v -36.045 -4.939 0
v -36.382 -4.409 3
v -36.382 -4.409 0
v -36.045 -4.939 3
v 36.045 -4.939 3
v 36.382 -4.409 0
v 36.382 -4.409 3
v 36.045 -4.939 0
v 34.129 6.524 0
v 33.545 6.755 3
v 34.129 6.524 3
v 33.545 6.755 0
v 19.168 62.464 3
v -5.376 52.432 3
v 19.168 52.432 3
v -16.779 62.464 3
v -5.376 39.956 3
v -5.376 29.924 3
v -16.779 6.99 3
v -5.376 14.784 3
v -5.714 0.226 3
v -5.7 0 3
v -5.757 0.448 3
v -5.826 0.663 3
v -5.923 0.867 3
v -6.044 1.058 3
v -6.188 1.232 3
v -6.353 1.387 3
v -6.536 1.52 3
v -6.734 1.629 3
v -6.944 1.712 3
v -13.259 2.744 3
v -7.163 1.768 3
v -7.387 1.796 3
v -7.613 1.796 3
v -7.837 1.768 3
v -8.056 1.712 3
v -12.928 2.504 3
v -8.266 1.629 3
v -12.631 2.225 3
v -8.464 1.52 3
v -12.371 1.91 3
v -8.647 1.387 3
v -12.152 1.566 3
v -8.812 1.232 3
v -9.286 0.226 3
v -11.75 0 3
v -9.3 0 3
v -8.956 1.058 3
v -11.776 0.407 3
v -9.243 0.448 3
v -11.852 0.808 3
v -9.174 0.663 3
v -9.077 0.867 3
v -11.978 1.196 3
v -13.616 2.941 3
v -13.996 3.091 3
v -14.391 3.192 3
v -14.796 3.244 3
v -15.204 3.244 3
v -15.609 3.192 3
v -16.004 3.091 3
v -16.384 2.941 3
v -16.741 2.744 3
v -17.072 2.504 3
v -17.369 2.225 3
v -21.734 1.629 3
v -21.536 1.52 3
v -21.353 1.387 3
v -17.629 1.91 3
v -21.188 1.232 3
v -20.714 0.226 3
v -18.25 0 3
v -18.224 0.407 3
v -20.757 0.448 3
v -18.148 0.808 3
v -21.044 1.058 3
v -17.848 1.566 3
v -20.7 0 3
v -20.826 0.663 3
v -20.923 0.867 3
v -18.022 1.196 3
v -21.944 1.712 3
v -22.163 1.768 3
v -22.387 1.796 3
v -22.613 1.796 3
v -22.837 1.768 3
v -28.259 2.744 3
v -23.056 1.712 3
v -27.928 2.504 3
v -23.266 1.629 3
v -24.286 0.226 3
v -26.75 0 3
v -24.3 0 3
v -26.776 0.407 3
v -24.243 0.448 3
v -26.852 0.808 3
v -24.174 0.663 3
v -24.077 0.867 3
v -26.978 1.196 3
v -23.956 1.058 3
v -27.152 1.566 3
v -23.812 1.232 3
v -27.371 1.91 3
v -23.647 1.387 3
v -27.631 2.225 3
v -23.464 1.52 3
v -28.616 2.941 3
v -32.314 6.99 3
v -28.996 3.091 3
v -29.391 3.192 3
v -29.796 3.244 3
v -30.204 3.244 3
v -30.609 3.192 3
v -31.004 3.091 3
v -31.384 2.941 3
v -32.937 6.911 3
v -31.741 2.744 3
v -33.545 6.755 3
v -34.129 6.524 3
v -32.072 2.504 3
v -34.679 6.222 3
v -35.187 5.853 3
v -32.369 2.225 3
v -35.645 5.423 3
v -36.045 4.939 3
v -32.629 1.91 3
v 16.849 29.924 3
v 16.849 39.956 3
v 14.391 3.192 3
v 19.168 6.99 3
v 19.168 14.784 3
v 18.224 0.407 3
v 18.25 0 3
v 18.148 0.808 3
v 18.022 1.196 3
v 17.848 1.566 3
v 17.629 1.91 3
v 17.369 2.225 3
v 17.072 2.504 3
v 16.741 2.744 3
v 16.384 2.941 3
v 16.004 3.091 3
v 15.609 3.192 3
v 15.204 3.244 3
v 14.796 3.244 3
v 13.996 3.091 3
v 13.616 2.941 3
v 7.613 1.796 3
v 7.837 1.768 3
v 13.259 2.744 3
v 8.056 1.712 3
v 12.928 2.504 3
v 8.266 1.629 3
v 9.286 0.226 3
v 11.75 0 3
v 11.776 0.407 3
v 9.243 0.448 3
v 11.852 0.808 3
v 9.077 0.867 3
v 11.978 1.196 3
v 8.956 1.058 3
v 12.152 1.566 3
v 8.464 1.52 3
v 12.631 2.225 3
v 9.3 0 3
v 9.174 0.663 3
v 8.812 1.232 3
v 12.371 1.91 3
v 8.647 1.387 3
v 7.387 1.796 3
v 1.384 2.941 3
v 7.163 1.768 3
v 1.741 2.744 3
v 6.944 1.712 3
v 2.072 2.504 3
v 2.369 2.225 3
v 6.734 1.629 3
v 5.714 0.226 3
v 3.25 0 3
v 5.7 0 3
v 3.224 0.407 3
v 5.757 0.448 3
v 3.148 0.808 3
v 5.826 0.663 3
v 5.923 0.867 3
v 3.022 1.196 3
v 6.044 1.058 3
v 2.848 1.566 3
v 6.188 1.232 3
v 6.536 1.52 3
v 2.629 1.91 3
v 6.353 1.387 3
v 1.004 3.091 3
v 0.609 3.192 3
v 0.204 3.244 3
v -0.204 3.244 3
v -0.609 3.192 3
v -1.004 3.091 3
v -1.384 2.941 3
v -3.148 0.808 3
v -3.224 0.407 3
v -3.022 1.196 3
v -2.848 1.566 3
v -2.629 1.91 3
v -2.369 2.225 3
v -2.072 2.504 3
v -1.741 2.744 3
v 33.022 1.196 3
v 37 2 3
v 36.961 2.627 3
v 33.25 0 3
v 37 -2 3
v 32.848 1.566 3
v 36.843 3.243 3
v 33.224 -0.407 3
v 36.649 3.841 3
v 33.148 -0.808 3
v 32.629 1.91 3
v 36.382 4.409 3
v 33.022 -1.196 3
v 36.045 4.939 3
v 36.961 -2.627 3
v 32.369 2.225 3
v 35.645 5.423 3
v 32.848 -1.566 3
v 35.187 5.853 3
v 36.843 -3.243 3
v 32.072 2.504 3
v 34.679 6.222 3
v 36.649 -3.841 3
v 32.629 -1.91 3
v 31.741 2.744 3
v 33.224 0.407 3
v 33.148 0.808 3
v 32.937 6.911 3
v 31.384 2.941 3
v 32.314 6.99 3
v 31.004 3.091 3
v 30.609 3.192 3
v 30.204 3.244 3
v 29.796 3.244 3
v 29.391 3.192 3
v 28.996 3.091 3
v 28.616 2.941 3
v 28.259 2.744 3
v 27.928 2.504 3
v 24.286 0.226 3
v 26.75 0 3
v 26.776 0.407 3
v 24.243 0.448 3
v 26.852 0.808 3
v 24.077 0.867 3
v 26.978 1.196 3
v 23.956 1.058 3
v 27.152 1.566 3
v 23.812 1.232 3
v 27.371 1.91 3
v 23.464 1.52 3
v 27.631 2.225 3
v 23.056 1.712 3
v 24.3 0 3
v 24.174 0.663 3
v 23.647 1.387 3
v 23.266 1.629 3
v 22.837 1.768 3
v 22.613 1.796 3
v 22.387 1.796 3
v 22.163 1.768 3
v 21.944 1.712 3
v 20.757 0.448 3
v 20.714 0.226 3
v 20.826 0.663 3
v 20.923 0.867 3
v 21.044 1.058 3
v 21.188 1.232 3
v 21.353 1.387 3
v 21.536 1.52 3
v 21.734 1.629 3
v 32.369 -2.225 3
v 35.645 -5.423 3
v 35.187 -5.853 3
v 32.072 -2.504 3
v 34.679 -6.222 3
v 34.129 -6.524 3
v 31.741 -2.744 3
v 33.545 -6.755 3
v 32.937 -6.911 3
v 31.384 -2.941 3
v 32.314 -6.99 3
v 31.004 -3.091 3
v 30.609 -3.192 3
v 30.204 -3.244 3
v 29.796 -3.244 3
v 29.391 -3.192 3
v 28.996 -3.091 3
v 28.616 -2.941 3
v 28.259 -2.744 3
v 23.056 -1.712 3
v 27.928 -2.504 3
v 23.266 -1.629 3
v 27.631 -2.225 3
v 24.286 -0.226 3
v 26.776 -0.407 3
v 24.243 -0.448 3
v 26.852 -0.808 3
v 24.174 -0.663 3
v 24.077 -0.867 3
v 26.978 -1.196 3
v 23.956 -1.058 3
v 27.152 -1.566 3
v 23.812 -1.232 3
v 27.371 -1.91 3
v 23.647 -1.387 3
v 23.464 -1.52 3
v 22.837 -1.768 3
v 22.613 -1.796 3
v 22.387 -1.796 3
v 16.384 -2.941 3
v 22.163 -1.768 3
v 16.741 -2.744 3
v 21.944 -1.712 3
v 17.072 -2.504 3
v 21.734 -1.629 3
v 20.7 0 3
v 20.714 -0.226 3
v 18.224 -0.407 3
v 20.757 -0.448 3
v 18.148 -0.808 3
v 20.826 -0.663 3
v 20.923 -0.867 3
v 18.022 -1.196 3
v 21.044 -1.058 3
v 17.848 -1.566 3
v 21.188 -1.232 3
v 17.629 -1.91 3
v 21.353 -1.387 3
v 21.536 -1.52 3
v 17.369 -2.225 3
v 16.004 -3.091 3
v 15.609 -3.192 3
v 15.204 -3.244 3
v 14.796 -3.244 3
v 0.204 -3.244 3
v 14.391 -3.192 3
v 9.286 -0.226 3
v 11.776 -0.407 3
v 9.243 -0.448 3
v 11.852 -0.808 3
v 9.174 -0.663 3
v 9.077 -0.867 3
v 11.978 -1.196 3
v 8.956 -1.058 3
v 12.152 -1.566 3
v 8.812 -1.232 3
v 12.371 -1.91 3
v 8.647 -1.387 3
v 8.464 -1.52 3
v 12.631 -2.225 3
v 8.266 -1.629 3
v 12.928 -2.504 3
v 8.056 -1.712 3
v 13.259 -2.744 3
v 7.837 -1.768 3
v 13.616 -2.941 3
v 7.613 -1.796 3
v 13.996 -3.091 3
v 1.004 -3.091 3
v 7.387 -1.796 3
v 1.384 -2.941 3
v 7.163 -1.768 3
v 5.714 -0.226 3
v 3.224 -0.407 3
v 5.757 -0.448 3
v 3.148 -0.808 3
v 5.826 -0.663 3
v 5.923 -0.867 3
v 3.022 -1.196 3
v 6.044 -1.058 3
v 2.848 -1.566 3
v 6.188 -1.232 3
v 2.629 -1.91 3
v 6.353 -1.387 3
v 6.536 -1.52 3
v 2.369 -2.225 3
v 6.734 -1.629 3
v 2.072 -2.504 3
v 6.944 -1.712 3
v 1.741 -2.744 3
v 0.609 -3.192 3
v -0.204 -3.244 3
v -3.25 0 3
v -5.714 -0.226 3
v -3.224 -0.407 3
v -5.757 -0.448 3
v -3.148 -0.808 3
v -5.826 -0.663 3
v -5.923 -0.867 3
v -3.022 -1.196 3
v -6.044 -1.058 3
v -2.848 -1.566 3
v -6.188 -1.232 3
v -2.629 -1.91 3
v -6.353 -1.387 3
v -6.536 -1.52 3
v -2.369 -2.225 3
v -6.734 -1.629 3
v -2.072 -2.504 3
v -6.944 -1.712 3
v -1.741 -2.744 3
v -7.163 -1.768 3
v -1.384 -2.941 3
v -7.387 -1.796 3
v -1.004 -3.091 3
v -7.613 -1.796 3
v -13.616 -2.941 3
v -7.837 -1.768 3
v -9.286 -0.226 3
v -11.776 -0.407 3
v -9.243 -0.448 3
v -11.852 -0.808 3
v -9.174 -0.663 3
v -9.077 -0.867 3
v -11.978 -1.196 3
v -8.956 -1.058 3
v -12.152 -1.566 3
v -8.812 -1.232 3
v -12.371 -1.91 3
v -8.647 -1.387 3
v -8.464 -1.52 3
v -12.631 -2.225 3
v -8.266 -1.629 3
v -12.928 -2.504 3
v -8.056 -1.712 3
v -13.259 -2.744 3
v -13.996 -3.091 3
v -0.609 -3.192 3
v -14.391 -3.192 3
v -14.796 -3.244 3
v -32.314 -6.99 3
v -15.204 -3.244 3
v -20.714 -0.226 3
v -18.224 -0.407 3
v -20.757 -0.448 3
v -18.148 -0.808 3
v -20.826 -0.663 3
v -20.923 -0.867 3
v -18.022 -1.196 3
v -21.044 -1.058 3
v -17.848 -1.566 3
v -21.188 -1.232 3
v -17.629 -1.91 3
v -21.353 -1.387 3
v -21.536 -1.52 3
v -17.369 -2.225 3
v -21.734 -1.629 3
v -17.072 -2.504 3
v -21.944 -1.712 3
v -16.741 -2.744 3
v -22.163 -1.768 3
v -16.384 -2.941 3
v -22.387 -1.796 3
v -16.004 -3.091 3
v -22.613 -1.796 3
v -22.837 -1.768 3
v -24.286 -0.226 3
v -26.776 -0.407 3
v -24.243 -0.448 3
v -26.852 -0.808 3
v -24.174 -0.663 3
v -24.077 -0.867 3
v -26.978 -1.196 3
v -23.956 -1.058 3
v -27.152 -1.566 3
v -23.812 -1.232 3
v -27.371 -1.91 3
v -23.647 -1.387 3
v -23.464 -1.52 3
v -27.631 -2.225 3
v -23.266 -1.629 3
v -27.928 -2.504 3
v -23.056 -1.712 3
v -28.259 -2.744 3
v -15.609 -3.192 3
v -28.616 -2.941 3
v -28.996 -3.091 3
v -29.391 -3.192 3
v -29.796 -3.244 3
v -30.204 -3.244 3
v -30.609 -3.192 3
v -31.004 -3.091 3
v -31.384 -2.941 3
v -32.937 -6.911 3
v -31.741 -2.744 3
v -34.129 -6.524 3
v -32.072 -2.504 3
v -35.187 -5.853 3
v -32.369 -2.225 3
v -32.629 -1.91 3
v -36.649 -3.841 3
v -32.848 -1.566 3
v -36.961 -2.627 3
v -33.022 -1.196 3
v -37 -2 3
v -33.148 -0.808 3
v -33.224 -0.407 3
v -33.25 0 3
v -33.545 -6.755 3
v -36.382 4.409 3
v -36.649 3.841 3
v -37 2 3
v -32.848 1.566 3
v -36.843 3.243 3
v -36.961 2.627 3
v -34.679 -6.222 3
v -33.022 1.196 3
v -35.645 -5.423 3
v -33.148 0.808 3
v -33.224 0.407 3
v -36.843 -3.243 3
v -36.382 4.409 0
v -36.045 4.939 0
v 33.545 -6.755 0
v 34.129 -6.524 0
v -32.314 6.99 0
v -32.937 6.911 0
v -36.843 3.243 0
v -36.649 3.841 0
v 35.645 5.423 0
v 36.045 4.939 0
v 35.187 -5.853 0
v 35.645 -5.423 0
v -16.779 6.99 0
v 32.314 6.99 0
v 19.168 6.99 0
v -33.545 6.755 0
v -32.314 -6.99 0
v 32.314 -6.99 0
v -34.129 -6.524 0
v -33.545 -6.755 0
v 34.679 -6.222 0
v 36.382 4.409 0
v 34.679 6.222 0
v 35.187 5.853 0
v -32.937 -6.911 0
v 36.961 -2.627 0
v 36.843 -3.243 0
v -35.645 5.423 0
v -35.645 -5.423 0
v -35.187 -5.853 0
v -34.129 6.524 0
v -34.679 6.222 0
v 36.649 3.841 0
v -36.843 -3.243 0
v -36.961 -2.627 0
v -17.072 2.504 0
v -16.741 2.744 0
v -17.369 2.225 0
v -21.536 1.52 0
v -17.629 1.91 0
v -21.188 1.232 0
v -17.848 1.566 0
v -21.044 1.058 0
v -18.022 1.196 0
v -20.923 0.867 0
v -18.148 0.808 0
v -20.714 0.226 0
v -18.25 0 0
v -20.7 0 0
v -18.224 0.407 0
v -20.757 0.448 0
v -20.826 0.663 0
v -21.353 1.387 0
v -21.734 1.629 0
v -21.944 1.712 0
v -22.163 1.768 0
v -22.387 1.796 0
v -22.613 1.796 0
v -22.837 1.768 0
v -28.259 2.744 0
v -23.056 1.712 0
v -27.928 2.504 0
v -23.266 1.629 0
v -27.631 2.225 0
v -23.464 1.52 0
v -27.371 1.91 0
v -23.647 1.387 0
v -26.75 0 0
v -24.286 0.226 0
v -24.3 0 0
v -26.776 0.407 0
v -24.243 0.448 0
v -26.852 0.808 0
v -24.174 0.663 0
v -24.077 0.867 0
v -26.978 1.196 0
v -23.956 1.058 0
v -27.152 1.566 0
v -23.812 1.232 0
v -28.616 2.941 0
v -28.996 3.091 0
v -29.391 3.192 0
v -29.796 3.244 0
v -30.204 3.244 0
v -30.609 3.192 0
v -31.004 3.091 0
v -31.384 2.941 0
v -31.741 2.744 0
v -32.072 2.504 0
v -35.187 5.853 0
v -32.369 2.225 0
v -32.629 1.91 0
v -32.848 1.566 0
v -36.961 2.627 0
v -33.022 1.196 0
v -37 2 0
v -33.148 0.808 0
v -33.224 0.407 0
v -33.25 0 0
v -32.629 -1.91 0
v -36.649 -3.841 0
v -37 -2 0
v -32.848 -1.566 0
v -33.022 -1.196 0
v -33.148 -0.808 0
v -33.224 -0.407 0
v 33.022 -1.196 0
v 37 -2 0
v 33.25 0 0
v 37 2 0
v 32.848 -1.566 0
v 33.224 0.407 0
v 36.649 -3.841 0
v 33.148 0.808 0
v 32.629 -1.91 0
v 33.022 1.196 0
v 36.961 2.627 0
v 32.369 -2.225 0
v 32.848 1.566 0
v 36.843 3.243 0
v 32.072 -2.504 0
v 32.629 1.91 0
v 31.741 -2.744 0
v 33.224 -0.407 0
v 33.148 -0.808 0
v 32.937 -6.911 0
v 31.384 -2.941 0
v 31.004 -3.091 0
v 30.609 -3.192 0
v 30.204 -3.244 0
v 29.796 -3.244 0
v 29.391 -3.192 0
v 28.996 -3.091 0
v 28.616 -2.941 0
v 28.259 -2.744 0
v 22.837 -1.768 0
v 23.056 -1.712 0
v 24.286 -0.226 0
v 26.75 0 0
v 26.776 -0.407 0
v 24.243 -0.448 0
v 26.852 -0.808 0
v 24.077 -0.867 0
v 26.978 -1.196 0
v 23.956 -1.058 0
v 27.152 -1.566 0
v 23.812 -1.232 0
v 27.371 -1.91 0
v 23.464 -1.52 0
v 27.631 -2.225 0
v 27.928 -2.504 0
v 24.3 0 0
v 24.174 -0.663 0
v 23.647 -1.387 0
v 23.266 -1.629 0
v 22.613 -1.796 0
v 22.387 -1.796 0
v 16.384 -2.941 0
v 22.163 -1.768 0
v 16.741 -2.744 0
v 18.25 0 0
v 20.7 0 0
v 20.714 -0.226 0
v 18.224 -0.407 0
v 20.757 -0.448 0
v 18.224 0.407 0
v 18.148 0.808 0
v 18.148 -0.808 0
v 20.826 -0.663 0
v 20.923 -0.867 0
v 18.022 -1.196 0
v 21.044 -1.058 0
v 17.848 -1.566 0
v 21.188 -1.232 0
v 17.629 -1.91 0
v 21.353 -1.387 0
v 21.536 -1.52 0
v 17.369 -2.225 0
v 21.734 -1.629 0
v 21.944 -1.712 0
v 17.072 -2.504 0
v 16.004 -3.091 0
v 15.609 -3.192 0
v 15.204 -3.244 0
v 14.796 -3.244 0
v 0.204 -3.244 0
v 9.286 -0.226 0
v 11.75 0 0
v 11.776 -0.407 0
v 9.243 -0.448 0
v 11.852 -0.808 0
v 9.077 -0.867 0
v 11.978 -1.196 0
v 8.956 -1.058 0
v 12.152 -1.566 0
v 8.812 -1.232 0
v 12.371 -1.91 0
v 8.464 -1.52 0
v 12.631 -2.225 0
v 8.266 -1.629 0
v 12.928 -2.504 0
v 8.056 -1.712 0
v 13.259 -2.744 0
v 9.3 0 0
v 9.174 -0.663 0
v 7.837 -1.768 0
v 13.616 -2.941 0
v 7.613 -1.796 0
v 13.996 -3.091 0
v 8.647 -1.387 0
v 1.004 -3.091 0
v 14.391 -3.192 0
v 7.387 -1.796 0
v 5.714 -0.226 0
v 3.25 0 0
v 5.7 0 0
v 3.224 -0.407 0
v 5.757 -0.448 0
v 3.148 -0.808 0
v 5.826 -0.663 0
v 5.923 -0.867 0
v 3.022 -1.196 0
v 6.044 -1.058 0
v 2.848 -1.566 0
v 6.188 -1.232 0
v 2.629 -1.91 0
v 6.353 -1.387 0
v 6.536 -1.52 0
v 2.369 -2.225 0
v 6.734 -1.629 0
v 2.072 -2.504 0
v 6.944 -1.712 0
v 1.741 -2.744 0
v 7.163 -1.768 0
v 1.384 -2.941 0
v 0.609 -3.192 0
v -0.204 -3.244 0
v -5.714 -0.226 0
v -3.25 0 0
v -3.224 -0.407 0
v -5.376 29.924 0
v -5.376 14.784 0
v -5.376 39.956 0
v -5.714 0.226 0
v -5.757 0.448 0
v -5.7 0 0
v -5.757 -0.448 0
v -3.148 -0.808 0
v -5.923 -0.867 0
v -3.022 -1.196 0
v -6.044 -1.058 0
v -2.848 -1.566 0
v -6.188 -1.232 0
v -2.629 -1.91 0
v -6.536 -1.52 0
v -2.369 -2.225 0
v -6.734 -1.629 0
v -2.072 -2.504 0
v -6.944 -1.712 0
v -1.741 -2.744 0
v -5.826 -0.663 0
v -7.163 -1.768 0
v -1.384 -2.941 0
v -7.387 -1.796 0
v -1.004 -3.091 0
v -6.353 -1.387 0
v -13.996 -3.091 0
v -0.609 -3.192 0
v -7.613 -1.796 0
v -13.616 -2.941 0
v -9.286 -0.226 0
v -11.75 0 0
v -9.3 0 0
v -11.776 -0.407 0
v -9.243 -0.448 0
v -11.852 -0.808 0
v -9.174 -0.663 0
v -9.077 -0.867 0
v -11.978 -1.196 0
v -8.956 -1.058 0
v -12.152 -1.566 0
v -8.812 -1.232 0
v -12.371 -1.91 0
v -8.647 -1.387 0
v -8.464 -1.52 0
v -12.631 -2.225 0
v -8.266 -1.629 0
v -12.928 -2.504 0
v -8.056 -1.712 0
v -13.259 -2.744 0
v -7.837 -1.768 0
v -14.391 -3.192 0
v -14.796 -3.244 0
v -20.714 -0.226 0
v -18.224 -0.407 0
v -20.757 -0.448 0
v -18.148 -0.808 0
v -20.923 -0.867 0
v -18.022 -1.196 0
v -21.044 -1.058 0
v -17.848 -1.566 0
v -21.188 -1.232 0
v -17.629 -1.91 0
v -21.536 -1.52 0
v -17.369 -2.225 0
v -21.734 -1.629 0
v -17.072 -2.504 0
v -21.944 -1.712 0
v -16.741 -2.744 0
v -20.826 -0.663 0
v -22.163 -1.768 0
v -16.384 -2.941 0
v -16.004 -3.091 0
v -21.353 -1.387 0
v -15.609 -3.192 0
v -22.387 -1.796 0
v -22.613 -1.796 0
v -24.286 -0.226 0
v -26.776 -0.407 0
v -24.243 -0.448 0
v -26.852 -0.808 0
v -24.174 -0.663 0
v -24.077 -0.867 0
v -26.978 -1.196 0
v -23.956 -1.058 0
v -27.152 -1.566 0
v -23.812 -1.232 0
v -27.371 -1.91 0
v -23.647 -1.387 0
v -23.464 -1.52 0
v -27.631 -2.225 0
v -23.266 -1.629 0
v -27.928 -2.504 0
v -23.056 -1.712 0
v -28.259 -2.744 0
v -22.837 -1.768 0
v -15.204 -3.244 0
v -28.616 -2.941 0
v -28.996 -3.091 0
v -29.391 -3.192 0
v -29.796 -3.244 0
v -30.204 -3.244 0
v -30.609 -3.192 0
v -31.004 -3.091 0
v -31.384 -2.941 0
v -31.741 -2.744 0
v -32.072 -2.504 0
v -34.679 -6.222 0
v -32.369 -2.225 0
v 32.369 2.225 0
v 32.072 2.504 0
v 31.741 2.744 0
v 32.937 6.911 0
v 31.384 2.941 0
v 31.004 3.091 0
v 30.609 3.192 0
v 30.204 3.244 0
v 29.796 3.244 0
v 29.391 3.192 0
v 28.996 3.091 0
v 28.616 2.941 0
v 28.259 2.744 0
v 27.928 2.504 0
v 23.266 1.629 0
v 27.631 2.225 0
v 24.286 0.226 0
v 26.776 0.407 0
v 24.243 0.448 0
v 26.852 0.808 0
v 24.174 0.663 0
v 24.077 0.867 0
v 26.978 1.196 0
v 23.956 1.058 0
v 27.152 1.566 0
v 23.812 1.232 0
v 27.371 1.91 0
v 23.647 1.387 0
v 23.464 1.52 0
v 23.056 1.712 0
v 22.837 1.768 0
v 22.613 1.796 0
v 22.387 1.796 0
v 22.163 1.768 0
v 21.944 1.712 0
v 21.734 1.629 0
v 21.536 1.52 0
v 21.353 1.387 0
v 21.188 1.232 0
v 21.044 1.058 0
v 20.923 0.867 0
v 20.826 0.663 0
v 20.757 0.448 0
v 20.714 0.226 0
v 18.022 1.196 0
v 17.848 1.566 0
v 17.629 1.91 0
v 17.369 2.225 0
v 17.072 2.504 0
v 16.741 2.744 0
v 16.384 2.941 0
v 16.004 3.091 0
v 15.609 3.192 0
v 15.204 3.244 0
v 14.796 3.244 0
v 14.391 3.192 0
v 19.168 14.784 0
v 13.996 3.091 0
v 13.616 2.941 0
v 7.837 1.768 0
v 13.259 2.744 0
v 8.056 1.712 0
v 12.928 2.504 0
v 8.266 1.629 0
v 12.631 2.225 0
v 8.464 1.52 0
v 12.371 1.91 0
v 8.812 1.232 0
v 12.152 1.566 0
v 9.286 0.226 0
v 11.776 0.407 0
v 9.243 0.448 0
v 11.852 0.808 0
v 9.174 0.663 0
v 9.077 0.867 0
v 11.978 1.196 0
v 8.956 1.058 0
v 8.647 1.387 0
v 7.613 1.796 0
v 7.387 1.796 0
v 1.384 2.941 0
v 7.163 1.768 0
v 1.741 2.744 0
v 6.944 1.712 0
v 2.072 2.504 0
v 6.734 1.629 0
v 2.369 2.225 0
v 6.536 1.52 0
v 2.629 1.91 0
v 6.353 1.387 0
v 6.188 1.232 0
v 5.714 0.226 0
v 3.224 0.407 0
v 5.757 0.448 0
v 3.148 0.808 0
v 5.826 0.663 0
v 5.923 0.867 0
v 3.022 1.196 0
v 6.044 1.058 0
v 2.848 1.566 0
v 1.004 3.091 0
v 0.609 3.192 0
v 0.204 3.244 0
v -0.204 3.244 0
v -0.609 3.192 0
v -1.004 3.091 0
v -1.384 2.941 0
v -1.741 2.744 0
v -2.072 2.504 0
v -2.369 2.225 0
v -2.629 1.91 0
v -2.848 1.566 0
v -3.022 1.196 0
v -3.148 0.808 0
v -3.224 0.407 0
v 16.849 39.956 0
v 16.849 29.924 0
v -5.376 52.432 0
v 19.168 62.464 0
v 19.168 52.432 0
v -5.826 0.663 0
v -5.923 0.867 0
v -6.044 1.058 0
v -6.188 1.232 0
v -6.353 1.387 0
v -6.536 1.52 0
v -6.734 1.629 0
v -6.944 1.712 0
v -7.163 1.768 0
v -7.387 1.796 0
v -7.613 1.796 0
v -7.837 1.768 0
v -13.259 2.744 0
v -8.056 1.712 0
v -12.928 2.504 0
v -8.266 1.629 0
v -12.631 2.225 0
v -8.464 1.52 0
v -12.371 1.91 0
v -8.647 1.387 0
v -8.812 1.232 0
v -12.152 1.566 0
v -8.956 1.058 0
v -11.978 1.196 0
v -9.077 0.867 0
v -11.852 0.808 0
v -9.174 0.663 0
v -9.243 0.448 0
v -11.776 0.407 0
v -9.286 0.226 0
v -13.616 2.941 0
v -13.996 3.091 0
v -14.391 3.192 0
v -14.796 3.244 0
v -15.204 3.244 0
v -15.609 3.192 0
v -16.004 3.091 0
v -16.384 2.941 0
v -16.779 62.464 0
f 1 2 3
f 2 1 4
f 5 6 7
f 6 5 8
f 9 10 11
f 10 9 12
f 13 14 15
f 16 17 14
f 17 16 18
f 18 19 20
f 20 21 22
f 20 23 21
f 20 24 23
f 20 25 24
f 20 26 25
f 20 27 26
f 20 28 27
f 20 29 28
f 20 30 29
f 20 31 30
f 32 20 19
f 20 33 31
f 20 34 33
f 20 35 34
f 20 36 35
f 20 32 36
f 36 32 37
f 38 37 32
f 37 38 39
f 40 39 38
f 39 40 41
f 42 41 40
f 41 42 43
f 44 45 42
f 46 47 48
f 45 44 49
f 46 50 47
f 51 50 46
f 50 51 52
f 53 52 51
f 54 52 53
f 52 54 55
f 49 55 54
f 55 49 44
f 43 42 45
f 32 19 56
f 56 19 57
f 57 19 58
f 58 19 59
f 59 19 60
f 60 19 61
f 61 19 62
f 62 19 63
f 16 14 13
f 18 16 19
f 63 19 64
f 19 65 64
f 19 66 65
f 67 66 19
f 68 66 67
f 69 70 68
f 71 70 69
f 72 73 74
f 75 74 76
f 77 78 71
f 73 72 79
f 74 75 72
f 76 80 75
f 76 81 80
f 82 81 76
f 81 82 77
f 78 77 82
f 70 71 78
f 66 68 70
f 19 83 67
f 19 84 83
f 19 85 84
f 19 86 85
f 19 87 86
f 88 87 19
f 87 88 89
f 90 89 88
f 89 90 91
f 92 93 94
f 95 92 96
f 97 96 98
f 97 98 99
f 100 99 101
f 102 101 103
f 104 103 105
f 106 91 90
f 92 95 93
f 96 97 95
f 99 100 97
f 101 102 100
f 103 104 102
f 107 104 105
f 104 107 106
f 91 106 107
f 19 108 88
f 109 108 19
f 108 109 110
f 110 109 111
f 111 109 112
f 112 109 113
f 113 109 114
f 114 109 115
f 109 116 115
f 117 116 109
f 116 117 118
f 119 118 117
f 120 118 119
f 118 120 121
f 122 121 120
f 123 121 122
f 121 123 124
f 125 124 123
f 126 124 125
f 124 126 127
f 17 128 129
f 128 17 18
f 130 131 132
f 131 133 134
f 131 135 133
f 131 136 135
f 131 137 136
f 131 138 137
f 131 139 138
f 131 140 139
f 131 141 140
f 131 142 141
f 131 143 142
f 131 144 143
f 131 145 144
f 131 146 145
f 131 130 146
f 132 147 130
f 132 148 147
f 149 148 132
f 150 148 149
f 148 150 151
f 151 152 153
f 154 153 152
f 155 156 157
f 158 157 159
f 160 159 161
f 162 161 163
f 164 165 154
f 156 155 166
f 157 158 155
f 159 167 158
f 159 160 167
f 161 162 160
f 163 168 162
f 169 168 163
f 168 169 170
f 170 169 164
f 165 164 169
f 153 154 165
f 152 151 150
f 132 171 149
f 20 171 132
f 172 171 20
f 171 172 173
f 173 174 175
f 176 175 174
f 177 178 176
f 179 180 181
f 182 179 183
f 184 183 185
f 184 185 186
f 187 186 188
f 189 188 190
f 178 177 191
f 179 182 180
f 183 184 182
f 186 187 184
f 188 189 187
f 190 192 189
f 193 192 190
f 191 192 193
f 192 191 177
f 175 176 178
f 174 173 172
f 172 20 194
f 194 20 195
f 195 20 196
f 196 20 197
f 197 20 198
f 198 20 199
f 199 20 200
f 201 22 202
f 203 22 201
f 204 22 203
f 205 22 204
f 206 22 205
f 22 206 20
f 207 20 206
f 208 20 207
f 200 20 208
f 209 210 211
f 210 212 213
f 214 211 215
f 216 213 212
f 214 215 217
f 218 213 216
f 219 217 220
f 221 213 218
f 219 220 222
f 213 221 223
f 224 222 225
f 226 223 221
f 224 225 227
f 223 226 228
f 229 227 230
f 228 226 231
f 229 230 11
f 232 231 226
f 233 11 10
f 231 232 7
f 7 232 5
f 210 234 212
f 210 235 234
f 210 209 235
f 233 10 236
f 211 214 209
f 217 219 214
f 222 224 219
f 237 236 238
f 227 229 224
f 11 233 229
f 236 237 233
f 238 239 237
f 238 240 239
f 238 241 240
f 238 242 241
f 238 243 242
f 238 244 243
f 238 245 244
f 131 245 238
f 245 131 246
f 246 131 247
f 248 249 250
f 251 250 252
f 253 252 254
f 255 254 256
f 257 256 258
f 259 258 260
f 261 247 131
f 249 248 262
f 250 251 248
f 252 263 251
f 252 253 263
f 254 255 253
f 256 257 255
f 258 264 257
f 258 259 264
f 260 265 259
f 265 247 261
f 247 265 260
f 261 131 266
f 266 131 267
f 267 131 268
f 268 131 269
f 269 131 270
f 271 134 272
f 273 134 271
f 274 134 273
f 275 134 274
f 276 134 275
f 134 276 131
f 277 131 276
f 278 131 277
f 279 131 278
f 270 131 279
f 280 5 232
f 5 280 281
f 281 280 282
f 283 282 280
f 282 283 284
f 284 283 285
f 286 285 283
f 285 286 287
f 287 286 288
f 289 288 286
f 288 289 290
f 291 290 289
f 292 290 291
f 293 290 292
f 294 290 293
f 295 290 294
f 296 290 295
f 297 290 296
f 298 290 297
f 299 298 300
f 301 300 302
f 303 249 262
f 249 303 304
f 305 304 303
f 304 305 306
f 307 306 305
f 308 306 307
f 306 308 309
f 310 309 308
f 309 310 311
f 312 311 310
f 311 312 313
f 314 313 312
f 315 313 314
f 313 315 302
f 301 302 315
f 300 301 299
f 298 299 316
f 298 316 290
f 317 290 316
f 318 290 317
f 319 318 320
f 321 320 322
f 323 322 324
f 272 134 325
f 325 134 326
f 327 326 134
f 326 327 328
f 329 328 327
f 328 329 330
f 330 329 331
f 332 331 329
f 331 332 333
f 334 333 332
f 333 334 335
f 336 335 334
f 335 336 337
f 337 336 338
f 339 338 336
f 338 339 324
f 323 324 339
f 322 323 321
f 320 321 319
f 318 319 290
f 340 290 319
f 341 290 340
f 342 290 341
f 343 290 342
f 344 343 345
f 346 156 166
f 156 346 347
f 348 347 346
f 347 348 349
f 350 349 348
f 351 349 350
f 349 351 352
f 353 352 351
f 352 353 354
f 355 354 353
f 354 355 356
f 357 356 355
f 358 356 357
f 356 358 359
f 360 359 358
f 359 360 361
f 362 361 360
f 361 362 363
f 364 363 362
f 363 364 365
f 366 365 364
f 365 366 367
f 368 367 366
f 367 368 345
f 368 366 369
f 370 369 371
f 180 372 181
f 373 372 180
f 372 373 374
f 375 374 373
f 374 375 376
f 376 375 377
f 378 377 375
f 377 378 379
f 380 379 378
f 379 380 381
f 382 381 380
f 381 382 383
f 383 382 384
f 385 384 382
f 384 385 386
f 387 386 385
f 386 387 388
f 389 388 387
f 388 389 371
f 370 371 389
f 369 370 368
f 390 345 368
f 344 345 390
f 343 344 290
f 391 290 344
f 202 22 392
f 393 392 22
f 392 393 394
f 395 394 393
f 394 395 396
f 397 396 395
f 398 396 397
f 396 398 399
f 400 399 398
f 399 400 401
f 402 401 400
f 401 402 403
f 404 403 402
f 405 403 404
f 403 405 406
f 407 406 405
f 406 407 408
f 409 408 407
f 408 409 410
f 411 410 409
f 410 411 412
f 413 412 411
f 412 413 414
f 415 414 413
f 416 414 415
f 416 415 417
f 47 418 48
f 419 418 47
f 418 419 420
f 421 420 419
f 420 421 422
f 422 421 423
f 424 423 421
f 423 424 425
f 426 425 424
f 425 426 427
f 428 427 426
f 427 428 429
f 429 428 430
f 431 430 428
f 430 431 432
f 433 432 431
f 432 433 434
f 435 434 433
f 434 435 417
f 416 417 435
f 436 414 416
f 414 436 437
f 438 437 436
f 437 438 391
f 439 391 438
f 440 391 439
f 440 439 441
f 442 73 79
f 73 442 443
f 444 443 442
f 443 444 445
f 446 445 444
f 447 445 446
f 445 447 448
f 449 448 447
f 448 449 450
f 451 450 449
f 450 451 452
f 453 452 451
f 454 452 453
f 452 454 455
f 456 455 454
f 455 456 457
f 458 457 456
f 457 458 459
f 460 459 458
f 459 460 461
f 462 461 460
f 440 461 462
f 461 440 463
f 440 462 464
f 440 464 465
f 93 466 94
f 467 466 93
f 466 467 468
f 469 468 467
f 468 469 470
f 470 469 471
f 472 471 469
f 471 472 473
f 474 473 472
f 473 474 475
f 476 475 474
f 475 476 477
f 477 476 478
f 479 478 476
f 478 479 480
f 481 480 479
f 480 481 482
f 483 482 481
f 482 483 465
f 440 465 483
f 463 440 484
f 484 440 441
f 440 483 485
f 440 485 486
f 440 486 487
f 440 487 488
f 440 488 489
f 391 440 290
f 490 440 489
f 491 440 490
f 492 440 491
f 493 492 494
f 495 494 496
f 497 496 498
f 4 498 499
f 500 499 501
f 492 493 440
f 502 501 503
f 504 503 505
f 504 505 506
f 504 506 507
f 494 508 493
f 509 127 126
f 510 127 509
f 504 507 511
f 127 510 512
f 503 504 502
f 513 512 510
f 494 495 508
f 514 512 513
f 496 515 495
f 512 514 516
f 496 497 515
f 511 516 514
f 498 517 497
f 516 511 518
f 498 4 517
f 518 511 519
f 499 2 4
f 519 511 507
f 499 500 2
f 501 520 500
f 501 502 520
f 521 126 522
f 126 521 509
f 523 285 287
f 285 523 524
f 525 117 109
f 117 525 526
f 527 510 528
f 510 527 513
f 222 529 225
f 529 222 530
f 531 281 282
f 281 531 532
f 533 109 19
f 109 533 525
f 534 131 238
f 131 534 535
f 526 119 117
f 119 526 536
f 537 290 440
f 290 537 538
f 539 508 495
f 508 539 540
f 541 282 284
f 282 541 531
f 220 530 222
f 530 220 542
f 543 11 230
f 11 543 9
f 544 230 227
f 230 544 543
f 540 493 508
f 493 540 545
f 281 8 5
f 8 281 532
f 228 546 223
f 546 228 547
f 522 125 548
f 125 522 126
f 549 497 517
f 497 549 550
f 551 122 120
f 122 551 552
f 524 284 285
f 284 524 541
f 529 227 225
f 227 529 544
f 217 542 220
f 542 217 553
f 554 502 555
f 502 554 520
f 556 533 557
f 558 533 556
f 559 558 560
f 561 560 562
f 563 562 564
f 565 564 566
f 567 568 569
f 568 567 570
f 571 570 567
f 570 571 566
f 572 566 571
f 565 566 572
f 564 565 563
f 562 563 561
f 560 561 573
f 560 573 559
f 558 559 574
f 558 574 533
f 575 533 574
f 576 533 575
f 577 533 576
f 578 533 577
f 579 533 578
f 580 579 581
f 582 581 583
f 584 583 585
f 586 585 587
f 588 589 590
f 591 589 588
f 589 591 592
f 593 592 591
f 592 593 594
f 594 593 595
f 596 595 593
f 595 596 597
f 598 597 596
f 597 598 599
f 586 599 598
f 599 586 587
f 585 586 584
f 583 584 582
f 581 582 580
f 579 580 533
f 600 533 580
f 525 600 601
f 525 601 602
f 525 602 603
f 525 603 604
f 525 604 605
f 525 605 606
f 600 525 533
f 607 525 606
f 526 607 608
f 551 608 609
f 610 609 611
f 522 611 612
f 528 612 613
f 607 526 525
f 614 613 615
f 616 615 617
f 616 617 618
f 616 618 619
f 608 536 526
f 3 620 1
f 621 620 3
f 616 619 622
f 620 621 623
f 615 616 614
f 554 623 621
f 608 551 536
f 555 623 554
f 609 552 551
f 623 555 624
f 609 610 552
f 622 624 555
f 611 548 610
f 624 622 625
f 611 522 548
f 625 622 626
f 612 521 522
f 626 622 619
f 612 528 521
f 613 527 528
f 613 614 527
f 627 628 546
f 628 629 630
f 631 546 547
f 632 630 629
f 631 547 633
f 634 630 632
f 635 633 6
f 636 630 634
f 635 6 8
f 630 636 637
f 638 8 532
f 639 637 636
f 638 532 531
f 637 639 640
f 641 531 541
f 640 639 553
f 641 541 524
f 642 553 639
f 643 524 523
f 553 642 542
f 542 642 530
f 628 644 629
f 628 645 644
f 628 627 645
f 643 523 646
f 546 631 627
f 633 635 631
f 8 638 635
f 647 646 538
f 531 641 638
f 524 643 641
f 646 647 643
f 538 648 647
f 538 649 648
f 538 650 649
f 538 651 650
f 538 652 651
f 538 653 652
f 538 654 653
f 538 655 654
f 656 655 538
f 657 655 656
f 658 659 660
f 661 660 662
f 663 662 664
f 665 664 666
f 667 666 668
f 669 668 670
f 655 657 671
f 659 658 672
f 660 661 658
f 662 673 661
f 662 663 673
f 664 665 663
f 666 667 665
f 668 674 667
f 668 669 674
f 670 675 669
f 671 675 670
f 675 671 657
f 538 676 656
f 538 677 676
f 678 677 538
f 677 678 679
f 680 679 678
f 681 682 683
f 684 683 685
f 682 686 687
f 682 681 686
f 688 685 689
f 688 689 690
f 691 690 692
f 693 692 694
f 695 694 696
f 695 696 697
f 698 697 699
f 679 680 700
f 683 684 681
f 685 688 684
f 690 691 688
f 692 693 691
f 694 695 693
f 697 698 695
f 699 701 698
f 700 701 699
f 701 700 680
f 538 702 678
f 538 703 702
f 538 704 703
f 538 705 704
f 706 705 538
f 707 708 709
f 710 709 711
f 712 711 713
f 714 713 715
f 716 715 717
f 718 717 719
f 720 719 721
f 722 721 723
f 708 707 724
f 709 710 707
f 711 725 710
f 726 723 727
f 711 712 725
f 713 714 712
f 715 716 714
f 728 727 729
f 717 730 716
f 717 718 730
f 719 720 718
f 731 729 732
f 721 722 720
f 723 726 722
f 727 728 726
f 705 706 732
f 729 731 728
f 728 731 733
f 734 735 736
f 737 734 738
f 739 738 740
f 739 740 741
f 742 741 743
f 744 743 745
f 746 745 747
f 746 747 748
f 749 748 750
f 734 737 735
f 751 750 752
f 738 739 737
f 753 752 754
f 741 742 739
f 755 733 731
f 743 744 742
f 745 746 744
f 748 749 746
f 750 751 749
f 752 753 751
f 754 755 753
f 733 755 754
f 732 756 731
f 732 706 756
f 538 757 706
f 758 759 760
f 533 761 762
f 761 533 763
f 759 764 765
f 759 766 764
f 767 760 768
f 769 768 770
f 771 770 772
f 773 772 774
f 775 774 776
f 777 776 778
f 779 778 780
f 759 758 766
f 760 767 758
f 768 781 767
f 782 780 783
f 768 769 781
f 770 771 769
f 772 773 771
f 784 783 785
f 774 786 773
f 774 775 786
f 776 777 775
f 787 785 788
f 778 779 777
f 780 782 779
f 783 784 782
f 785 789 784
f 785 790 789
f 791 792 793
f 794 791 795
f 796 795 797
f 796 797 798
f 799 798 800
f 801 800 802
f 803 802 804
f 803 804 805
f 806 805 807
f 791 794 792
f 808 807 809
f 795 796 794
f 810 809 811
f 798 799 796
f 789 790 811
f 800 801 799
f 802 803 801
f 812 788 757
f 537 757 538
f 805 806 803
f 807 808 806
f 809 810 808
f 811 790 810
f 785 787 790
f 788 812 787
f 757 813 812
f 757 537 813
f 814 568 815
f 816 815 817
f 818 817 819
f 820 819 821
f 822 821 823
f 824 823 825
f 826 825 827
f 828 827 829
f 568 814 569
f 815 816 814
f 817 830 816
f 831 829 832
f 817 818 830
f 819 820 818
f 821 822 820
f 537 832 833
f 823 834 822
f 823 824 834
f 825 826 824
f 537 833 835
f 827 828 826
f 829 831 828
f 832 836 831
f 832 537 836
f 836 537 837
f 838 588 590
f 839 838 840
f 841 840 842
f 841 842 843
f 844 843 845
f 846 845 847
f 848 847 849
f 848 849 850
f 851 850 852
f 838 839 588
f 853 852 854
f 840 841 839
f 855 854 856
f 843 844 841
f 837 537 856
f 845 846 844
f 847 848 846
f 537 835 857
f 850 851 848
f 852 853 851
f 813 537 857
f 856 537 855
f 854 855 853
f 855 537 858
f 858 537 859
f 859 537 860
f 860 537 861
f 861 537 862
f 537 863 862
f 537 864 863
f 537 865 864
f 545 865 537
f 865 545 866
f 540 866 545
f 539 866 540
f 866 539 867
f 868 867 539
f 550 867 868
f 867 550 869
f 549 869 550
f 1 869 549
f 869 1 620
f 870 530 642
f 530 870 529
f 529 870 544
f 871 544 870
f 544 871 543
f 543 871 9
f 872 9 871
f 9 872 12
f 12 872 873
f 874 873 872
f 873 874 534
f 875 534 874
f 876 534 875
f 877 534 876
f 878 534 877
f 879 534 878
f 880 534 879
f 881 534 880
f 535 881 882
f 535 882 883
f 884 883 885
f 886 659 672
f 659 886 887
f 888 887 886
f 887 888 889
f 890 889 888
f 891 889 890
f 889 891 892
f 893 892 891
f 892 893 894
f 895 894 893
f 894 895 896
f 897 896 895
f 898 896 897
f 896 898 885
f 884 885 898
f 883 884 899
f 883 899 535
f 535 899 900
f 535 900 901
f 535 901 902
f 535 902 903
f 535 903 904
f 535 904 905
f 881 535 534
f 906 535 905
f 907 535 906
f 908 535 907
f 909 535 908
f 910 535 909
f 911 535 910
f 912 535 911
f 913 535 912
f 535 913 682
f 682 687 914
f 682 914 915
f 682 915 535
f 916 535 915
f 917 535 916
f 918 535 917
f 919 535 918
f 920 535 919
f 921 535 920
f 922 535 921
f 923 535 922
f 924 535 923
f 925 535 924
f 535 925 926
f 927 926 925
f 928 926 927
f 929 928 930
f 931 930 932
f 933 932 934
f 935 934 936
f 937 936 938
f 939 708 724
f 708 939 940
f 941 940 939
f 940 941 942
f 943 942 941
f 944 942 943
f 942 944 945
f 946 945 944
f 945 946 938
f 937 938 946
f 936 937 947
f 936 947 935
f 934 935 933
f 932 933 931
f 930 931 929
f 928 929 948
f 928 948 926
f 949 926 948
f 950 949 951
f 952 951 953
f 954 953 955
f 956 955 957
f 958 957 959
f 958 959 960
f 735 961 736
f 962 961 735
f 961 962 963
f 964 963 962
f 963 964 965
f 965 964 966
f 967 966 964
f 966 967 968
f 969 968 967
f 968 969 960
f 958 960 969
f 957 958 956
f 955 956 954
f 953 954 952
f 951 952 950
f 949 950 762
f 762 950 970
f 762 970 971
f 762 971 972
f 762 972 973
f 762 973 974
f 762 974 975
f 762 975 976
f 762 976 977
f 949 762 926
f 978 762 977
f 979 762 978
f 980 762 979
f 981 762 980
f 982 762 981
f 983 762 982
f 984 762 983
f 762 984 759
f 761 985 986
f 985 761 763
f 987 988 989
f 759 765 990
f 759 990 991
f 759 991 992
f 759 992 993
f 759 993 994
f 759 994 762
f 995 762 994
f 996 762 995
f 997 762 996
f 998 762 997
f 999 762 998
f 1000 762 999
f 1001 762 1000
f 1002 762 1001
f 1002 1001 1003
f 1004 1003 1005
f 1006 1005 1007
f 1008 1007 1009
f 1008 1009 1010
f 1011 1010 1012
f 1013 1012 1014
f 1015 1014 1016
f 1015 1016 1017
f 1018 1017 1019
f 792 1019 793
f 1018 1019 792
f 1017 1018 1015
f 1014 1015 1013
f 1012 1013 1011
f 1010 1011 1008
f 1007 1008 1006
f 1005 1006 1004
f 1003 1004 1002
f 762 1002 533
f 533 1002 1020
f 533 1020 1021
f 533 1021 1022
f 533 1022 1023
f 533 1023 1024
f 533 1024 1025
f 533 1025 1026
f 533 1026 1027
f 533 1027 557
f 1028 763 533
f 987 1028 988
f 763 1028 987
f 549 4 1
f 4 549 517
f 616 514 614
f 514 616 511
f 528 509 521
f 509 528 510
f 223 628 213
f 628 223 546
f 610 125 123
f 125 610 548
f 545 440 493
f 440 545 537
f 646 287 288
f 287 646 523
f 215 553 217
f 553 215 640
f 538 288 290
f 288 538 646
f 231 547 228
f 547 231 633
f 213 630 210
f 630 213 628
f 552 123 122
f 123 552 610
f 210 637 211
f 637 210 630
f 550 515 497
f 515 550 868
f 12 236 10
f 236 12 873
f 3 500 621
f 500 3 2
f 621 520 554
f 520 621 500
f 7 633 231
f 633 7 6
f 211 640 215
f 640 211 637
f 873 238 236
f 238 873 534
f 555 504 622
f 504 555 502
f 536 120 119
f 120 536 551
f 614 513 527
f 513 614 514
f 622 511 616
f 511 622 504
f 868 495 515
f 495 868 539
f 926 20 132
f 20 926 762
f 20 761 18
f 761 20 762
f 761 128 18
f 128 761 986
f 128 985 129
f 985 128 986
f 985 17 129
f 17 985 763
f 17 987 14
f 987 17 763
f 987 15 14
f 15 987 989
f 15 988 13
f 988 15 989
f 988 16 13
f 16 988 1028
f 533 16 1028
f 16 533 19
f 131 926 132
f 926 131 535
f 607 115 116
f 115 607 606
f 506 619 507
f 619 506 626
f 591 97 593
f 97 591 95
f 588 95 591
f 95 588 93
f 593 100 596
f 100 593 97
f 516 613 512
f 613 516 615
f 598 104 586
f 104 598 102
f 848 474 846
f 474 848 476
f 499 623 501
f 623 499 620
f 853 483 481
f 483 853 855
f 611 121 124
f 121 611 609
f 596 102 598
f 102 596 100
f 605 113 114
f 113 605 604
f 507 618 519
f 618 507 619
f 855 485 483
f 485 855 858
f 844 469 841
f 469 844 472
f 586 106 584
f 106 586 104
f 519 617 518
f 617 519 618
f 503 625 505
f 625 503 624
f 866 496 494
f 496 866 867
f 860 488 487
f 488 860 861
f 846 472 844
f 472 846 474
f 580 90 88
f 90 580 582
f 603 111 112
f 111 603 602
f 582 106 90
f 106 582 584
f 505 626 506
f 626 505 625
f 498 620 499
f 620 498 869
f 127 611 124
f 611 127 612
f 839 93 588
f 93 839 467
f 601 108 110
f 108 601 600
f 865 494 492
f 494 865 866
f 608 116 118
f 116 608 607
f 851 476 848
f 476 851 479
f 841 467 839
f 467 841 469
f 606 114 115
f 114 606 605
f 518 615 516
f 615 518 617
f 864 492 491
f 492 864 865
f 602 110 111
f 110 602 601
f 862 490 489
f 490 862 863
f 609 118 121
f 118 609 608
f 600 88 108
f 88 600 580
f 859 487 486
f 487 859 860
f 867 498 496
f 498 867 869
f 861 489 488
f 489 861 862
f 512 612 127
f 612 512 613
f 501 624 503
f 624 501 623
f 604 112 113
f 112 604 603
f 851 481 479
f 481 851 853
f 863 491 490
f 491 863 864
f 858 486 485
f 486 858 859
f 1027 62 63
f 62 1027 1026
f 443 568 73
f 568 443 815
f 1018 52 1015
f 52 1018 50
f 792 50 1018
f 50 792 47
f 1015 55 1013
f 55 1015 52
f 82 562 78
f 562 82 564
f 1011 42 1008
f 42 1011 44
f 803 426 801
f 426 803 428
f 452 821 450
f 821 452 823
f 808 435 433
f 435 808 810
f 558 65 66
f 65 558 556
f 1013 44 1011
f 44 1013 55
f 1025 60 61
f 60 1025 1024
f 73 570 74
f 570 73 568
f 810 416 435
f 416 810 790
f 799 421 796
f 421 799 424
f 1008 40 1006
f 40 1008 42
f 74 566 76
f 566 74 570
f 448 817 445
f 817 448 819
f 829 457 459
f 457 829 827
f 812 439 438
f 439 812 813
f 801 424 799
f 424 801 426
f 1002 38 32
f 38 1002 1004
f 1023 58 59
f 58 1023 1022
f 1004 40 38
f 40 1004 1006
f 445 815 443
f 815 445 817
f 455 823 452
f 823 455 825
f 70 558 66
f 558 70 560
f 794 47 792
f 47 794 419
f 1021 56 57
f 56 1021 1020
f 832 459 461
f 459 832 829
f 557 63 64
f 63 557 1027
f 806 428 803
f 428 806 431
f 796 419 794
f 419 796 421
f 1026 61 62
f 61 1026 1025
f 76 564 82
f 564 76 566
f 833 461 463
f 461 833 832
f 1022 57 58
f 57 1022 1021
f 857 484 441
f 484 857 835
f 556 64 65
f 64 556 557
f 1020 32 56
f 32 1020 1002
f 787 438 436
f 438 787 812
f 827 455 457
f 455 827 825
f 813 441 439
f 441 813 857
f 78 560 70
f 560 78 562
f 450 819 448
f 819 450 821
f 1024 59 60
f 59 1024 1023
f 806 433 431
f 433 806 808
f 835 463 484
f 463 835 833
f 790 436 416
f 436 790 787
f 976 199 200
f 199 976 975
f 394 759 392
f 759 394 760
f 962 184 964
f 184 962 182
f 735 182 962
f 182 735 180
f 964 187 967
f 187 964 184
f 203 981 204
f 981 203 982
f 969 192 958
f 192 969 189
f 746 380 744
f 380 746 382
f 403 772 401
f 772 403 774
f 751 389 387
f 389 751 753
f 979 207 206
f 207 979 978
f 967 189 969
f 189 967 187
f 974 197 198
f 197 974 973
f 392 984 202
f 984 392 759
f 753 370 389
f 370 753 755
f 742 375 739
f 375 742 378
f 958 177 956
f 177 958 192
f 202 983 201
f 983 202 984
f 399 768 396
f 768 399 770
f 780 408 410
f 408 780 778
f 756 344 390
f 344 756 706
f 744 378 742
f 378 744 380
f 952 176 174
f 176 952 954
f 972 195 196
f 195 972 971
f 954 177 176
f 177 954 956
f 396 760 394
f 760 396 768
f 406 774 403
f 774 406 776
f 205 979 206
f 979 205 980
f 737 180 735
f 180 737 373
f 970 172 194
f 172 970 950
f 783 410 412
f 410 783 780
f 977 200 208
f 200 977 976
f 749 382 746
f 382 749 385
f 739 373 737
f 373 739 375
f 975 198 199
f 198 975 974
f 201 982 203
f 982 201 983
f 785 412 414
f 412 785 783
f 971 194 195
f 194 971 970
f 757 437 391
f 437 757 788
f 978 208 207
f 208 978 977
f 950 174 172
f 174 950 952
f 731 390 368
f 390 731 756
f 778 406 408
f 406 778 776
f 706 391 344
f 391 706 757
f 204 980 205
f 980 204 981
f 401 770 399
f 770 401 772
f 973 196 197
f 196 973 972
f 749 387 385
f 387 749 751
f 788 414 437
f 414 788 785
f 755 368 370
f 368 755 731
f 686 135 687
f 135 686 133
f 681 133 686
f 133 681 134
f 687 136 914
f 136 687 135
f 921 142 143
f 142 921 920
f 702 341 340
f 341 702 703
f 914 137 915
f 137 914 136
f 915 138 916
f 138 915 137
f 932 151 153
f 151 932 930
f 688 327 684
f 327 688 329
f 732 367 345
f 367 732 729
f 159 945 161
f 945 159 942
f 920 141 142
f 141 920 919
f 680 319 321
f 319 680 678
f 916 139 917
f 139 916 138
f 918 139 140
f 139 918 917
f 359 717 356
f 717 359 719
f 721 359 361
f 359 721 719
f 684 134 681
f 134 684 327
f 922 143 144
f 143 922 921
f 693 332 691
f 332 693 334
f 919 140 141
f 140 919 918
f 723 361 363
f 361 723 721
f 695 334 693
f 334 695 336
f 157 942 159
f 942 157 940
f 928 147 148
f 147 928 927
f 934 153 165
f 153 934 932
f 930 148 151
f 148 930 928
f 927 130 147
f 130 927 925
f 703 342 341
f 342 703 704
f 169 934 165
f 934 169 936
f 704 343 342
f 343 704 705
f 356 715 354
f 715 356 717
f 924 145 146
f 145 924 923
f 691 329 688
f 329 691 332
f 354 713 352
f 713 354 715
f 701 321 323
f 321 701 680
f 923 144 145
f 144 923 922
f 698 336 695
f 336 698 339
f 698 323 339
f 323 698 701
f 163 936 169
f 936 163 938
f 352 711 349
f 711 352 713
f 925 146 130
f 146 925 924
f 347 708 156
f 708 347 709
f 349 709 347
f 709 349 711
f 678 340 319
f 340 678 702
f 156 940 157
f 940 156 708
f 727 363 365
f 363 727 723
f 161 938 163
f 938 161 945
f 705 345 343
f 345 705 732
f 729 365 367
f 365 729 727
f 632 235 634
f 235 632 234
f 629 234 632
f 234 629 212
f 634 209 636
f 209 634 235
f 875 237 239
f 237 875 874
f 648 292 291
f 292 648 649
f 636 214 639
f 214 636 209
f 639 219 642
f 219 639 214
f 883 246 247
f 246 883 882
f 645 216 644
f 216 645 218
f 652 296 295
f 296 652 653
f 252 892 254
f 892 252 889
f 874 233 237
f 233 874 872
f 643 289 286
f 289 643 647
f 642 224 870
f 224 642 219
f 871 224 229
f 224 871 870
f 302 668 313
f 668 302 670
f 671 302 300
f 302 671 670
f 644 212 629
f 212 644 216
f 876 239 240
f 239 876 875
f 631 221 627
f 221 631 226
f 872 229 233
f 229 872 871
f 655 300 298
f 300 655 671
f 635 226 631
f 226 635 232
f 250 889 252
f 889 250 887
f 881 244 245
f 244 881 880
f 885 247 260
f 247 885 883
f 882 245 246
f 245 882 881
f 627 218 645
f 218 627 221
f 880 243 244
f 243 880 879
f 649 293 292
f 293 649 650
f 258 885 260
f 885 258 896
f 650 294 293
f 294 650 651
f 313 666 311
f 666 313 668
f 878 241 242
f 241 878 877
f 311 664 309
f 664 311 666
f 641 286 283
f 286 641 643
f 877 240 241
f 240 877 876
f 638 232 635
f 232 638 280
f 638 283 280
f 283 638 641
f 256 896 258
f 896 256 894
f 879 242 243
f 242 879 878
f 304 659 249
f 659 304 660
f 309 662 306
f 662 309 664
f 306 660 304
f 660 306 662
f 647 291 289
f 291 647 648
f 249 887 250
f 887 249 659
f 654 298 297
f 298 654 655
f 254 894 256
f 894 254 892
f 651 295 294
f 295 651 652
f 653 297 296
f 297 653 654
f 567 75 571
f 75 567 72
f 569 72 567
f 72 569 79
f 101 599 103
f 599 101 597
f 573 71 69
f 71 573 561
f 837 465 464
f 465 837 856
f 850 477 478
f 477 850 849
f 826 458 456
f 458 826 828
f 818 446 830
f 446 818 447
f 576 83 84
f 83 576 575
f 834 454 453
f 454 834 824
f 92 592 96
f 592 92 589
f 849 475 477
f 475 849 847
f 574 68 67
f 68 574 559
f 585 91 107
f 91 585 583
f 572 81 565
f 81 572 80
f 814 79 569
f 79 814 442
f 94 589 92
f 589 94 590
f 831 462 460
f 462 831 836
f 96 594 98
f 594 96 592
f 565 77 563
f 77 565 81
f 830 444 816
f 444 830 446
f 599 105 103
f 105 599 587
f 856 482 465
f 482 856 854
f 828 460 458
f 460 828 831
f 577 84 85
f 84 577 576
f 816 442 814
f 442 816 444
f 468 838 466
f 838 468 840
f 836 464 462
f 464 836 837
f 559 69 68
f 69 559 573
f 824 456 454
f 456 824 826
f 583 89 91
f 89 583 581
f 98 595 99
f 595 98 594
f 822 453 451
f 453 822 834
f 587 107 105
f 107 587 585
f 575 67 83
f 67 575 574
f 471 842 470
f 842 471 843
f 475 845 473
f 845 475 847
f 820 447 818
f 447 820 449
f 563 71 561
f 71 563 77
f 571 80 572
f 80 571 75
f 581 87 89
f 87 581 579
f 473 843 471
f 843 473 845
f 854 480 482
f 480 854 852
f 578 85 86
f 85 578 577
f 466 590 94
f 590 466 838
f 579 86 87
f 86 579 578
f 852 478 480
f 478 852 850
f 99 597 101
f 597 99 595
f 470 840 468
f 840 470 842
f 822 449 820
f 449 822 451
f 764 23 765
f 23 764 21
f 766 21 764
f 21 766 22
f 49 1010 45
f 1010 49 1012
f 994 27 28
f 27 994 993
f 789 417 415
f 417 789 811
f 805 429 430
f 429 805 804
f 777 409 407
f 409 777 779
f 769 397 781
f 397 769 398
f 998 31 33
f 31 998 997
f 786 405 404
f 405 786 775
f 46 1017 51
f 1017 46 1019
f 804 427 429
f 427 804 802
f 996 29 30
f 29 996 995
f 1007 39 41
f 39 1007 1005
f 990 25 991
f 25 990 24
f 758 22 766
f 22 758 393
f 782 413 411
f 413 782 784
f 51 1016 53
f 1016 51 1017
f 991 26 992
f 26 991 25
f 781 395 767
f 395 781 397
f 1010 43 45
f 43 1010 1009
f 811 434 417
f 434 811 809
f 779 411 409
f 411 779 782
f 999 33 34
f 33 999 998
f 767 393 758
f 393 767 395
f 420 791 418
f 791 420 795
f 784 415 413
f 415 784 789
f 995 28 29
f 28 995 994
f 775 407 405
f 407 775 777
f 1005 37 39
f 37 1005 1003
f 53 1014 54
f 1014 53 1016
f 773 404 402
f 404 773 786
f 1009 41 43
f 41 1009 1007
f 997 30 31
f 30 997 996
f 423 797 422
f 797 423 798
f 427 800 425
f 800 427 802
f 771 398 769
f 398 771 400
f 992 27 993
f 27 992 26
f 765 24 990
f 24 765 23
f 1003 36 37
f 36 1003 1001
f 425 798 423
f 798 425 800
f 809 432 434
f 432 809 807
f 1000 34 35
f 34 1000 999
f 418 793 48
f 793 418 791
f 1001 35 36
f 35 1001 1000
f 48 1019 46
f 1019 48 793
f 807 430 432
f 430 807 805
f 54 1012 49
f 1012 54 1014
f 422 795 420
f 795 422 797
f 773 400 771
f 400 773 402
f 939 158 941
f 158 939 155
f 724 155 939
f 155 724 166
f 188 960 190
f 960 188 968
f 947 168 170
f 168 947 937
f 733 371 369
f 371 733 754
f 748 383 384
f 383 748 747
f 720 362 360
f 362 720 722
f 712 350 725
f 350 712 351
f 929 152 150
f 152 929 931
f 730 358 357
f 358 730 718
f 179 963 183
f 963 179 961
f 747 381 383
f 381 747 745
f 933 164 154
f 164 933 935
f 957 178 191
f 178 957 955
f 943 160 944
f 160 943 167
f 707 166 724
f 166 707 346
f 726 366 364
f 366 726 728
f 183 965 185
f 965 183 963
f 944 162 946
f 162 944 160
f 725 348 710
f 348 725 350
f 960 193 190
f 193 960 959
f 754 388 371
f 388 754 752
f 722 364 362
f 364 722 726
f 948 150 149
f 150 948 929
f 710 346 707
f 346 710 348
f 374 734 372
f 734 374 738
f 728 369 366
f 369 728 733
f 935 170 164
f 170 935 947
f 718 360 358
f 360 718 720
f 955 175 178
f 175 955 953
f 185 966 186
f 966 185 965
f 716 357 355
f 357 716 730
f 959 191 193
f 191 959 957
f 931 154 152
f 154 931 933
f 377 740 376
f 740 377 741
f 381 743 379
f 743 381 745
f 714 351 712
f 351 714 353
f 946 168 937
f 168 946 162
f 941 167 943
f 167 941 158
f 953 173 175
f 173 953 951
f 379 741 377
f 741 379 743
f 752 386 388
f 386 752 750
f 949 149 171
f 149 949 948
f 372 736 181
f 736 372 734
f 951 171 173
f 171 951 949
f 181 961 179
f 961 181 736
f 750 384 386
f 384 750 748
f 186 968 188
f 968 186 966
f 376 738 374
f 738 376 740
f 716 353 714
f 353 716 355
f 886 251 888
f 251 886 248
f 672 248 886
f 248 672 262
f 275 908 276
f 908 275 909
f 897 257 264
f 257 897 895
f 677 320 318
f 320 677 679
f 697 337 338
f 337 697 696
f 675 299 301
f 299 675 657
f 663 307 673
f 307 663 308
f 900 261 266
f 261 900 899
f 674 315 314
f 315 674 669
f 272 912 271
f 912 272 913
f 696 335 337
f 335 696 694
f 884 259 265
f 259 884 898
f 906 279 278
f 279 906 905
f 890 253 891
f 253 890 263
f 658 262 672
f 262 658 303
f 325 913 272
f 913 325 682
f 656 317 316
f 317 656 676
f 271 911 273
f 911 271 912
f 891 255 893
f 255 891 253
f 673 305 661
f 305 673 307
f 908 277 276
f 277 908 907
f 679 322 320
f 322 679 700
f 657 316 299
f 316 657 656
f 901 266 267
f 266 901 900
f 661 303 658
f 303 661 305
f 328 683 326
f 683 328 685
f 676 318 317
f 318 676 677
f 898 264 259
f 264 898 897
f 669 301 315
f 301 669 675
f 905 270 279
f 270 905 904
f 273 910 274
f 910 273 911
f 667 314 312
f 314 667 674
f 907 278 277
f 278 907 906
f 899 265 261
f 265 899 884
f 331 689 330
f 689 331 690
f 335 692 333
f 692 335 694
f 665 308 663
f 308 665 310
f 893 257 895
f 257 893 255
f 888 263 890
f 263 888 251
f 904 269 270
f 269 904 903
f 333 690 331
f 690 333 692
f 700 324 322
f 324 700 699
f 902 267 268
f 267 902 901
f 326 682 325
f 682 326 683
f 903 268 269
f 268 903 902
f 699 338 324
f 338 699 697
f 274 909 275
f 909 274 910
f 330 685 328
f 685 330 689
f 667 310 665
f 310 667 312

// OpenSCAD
$fn = 50;


difference() {
	union() {
		hull() {
			translate(v = [-32.0000000000, 2.0000000000, 0]) {
				cylinder(h = 3, r = 5);
			}
			translate(v = [32.0000000000, 2.0000000000, 0]) {
				cylinder(h = 3, r = 5);
			}
			translate(v = [-32.0000000000, -2.0000000000, 0]) {
				cylinder(h = 3, r = 5);
			}
			translate(v = [32.0000000000, -2.0000000000, 0]) {
				cylinder(h = 3, r = 5);
			}
		}
		translate(v = [0, 61.1111111111, 0]) {
			linear_extrude(height = 3) {
				text(font = "DejaVu Sans Mono:style=Bold", halign = "center", size = 57.0000000000, text = "E", valign = "top");
			}
		}
	}
	union() {
		translate(v = [-30.0000000000, 0.0000000000, 0]) {
			translate(v = [0, 0, -100]) {
				cylinder(h = 200, r = 3.2500000000);
			}
		}
		translate(v = [-15.0000000000, 0.0000000000, 0]) {
			translate(v = [0, 0, -100]) {
				cylinder(h = 200, r = 3.2500000000);
			}
		}
		translate(v = [0, 0, -100]) {
			cylinder(h = 200, r = 3.2500000000);
		}
		translate(v = [15.0000000000, 0.0000000000, 0]) {
			translate(v = [0, 0, -100]) {
				cylinder(h = 200, r = 3.2500000000);
			}
		}
		translate(v = [30.0000000000, 0.0000000000, 0]) {
			translate(v = [0, 0, -100]) {
				cylinder(h = 200, r = 3.2500000000);
			}
		}
		translate(v = [-30.0000000000, 0.0000000000, 0]) {
			translate(v = [0, 0, -100]) {
				cylinder(h = 200, r = 1.8000000000);
			}
		}
		translate(v = [-22.5000000000, 0.0000000000, 0]) {
			translate(v = [0, 0, -100]) {
				cylinder(h = 200, r = 1.8000000000);
			}
		}
		translate(v = [-15.0000000000, 0.0000000000, 0]) {
			translate(v = [0, 0, -100]) {
				cylinder(h = 200, r = 1.8000000000);
			}
		}
		translate(v = [-7.5000000000, 0.0000000000, 0]) {
			translate(v = [0, 0, -100]) {
				cylinder(h = 200, r = 1.8000000000);
			}
		}
		translate(v = [0, 0, -100]) {
			cylinder(h = 200, r = 1.8000000000);
		}
		translate(v = [7.5000000000, 0.0000000000, 0]) {
			translate(v = [0, 0, -100]) {
				cylinder(h = 200, r = 1.8000000000);
			}
		}
		translate(v = [15.0000000000, 0.0000000000, 0]) {
			translate(v = [0, 0, -100]) {
				cylinder(h = 200, r = 1.8000000000);
			}
		}
		translate(v = [22.5000000000, 0.0000000000, 0]) {
			translate(v = [0, 0, -100]) {
				cylinder(h = 200, r = 1.8000000000);
			}
		}
		translate(v = [30.0000000000, 0.0000000000, 0]) {
			translate(v = [0, 0, -100]) {
				cylinder(h = 200, r = 1.8000000000);
			}
		}
	}
}
